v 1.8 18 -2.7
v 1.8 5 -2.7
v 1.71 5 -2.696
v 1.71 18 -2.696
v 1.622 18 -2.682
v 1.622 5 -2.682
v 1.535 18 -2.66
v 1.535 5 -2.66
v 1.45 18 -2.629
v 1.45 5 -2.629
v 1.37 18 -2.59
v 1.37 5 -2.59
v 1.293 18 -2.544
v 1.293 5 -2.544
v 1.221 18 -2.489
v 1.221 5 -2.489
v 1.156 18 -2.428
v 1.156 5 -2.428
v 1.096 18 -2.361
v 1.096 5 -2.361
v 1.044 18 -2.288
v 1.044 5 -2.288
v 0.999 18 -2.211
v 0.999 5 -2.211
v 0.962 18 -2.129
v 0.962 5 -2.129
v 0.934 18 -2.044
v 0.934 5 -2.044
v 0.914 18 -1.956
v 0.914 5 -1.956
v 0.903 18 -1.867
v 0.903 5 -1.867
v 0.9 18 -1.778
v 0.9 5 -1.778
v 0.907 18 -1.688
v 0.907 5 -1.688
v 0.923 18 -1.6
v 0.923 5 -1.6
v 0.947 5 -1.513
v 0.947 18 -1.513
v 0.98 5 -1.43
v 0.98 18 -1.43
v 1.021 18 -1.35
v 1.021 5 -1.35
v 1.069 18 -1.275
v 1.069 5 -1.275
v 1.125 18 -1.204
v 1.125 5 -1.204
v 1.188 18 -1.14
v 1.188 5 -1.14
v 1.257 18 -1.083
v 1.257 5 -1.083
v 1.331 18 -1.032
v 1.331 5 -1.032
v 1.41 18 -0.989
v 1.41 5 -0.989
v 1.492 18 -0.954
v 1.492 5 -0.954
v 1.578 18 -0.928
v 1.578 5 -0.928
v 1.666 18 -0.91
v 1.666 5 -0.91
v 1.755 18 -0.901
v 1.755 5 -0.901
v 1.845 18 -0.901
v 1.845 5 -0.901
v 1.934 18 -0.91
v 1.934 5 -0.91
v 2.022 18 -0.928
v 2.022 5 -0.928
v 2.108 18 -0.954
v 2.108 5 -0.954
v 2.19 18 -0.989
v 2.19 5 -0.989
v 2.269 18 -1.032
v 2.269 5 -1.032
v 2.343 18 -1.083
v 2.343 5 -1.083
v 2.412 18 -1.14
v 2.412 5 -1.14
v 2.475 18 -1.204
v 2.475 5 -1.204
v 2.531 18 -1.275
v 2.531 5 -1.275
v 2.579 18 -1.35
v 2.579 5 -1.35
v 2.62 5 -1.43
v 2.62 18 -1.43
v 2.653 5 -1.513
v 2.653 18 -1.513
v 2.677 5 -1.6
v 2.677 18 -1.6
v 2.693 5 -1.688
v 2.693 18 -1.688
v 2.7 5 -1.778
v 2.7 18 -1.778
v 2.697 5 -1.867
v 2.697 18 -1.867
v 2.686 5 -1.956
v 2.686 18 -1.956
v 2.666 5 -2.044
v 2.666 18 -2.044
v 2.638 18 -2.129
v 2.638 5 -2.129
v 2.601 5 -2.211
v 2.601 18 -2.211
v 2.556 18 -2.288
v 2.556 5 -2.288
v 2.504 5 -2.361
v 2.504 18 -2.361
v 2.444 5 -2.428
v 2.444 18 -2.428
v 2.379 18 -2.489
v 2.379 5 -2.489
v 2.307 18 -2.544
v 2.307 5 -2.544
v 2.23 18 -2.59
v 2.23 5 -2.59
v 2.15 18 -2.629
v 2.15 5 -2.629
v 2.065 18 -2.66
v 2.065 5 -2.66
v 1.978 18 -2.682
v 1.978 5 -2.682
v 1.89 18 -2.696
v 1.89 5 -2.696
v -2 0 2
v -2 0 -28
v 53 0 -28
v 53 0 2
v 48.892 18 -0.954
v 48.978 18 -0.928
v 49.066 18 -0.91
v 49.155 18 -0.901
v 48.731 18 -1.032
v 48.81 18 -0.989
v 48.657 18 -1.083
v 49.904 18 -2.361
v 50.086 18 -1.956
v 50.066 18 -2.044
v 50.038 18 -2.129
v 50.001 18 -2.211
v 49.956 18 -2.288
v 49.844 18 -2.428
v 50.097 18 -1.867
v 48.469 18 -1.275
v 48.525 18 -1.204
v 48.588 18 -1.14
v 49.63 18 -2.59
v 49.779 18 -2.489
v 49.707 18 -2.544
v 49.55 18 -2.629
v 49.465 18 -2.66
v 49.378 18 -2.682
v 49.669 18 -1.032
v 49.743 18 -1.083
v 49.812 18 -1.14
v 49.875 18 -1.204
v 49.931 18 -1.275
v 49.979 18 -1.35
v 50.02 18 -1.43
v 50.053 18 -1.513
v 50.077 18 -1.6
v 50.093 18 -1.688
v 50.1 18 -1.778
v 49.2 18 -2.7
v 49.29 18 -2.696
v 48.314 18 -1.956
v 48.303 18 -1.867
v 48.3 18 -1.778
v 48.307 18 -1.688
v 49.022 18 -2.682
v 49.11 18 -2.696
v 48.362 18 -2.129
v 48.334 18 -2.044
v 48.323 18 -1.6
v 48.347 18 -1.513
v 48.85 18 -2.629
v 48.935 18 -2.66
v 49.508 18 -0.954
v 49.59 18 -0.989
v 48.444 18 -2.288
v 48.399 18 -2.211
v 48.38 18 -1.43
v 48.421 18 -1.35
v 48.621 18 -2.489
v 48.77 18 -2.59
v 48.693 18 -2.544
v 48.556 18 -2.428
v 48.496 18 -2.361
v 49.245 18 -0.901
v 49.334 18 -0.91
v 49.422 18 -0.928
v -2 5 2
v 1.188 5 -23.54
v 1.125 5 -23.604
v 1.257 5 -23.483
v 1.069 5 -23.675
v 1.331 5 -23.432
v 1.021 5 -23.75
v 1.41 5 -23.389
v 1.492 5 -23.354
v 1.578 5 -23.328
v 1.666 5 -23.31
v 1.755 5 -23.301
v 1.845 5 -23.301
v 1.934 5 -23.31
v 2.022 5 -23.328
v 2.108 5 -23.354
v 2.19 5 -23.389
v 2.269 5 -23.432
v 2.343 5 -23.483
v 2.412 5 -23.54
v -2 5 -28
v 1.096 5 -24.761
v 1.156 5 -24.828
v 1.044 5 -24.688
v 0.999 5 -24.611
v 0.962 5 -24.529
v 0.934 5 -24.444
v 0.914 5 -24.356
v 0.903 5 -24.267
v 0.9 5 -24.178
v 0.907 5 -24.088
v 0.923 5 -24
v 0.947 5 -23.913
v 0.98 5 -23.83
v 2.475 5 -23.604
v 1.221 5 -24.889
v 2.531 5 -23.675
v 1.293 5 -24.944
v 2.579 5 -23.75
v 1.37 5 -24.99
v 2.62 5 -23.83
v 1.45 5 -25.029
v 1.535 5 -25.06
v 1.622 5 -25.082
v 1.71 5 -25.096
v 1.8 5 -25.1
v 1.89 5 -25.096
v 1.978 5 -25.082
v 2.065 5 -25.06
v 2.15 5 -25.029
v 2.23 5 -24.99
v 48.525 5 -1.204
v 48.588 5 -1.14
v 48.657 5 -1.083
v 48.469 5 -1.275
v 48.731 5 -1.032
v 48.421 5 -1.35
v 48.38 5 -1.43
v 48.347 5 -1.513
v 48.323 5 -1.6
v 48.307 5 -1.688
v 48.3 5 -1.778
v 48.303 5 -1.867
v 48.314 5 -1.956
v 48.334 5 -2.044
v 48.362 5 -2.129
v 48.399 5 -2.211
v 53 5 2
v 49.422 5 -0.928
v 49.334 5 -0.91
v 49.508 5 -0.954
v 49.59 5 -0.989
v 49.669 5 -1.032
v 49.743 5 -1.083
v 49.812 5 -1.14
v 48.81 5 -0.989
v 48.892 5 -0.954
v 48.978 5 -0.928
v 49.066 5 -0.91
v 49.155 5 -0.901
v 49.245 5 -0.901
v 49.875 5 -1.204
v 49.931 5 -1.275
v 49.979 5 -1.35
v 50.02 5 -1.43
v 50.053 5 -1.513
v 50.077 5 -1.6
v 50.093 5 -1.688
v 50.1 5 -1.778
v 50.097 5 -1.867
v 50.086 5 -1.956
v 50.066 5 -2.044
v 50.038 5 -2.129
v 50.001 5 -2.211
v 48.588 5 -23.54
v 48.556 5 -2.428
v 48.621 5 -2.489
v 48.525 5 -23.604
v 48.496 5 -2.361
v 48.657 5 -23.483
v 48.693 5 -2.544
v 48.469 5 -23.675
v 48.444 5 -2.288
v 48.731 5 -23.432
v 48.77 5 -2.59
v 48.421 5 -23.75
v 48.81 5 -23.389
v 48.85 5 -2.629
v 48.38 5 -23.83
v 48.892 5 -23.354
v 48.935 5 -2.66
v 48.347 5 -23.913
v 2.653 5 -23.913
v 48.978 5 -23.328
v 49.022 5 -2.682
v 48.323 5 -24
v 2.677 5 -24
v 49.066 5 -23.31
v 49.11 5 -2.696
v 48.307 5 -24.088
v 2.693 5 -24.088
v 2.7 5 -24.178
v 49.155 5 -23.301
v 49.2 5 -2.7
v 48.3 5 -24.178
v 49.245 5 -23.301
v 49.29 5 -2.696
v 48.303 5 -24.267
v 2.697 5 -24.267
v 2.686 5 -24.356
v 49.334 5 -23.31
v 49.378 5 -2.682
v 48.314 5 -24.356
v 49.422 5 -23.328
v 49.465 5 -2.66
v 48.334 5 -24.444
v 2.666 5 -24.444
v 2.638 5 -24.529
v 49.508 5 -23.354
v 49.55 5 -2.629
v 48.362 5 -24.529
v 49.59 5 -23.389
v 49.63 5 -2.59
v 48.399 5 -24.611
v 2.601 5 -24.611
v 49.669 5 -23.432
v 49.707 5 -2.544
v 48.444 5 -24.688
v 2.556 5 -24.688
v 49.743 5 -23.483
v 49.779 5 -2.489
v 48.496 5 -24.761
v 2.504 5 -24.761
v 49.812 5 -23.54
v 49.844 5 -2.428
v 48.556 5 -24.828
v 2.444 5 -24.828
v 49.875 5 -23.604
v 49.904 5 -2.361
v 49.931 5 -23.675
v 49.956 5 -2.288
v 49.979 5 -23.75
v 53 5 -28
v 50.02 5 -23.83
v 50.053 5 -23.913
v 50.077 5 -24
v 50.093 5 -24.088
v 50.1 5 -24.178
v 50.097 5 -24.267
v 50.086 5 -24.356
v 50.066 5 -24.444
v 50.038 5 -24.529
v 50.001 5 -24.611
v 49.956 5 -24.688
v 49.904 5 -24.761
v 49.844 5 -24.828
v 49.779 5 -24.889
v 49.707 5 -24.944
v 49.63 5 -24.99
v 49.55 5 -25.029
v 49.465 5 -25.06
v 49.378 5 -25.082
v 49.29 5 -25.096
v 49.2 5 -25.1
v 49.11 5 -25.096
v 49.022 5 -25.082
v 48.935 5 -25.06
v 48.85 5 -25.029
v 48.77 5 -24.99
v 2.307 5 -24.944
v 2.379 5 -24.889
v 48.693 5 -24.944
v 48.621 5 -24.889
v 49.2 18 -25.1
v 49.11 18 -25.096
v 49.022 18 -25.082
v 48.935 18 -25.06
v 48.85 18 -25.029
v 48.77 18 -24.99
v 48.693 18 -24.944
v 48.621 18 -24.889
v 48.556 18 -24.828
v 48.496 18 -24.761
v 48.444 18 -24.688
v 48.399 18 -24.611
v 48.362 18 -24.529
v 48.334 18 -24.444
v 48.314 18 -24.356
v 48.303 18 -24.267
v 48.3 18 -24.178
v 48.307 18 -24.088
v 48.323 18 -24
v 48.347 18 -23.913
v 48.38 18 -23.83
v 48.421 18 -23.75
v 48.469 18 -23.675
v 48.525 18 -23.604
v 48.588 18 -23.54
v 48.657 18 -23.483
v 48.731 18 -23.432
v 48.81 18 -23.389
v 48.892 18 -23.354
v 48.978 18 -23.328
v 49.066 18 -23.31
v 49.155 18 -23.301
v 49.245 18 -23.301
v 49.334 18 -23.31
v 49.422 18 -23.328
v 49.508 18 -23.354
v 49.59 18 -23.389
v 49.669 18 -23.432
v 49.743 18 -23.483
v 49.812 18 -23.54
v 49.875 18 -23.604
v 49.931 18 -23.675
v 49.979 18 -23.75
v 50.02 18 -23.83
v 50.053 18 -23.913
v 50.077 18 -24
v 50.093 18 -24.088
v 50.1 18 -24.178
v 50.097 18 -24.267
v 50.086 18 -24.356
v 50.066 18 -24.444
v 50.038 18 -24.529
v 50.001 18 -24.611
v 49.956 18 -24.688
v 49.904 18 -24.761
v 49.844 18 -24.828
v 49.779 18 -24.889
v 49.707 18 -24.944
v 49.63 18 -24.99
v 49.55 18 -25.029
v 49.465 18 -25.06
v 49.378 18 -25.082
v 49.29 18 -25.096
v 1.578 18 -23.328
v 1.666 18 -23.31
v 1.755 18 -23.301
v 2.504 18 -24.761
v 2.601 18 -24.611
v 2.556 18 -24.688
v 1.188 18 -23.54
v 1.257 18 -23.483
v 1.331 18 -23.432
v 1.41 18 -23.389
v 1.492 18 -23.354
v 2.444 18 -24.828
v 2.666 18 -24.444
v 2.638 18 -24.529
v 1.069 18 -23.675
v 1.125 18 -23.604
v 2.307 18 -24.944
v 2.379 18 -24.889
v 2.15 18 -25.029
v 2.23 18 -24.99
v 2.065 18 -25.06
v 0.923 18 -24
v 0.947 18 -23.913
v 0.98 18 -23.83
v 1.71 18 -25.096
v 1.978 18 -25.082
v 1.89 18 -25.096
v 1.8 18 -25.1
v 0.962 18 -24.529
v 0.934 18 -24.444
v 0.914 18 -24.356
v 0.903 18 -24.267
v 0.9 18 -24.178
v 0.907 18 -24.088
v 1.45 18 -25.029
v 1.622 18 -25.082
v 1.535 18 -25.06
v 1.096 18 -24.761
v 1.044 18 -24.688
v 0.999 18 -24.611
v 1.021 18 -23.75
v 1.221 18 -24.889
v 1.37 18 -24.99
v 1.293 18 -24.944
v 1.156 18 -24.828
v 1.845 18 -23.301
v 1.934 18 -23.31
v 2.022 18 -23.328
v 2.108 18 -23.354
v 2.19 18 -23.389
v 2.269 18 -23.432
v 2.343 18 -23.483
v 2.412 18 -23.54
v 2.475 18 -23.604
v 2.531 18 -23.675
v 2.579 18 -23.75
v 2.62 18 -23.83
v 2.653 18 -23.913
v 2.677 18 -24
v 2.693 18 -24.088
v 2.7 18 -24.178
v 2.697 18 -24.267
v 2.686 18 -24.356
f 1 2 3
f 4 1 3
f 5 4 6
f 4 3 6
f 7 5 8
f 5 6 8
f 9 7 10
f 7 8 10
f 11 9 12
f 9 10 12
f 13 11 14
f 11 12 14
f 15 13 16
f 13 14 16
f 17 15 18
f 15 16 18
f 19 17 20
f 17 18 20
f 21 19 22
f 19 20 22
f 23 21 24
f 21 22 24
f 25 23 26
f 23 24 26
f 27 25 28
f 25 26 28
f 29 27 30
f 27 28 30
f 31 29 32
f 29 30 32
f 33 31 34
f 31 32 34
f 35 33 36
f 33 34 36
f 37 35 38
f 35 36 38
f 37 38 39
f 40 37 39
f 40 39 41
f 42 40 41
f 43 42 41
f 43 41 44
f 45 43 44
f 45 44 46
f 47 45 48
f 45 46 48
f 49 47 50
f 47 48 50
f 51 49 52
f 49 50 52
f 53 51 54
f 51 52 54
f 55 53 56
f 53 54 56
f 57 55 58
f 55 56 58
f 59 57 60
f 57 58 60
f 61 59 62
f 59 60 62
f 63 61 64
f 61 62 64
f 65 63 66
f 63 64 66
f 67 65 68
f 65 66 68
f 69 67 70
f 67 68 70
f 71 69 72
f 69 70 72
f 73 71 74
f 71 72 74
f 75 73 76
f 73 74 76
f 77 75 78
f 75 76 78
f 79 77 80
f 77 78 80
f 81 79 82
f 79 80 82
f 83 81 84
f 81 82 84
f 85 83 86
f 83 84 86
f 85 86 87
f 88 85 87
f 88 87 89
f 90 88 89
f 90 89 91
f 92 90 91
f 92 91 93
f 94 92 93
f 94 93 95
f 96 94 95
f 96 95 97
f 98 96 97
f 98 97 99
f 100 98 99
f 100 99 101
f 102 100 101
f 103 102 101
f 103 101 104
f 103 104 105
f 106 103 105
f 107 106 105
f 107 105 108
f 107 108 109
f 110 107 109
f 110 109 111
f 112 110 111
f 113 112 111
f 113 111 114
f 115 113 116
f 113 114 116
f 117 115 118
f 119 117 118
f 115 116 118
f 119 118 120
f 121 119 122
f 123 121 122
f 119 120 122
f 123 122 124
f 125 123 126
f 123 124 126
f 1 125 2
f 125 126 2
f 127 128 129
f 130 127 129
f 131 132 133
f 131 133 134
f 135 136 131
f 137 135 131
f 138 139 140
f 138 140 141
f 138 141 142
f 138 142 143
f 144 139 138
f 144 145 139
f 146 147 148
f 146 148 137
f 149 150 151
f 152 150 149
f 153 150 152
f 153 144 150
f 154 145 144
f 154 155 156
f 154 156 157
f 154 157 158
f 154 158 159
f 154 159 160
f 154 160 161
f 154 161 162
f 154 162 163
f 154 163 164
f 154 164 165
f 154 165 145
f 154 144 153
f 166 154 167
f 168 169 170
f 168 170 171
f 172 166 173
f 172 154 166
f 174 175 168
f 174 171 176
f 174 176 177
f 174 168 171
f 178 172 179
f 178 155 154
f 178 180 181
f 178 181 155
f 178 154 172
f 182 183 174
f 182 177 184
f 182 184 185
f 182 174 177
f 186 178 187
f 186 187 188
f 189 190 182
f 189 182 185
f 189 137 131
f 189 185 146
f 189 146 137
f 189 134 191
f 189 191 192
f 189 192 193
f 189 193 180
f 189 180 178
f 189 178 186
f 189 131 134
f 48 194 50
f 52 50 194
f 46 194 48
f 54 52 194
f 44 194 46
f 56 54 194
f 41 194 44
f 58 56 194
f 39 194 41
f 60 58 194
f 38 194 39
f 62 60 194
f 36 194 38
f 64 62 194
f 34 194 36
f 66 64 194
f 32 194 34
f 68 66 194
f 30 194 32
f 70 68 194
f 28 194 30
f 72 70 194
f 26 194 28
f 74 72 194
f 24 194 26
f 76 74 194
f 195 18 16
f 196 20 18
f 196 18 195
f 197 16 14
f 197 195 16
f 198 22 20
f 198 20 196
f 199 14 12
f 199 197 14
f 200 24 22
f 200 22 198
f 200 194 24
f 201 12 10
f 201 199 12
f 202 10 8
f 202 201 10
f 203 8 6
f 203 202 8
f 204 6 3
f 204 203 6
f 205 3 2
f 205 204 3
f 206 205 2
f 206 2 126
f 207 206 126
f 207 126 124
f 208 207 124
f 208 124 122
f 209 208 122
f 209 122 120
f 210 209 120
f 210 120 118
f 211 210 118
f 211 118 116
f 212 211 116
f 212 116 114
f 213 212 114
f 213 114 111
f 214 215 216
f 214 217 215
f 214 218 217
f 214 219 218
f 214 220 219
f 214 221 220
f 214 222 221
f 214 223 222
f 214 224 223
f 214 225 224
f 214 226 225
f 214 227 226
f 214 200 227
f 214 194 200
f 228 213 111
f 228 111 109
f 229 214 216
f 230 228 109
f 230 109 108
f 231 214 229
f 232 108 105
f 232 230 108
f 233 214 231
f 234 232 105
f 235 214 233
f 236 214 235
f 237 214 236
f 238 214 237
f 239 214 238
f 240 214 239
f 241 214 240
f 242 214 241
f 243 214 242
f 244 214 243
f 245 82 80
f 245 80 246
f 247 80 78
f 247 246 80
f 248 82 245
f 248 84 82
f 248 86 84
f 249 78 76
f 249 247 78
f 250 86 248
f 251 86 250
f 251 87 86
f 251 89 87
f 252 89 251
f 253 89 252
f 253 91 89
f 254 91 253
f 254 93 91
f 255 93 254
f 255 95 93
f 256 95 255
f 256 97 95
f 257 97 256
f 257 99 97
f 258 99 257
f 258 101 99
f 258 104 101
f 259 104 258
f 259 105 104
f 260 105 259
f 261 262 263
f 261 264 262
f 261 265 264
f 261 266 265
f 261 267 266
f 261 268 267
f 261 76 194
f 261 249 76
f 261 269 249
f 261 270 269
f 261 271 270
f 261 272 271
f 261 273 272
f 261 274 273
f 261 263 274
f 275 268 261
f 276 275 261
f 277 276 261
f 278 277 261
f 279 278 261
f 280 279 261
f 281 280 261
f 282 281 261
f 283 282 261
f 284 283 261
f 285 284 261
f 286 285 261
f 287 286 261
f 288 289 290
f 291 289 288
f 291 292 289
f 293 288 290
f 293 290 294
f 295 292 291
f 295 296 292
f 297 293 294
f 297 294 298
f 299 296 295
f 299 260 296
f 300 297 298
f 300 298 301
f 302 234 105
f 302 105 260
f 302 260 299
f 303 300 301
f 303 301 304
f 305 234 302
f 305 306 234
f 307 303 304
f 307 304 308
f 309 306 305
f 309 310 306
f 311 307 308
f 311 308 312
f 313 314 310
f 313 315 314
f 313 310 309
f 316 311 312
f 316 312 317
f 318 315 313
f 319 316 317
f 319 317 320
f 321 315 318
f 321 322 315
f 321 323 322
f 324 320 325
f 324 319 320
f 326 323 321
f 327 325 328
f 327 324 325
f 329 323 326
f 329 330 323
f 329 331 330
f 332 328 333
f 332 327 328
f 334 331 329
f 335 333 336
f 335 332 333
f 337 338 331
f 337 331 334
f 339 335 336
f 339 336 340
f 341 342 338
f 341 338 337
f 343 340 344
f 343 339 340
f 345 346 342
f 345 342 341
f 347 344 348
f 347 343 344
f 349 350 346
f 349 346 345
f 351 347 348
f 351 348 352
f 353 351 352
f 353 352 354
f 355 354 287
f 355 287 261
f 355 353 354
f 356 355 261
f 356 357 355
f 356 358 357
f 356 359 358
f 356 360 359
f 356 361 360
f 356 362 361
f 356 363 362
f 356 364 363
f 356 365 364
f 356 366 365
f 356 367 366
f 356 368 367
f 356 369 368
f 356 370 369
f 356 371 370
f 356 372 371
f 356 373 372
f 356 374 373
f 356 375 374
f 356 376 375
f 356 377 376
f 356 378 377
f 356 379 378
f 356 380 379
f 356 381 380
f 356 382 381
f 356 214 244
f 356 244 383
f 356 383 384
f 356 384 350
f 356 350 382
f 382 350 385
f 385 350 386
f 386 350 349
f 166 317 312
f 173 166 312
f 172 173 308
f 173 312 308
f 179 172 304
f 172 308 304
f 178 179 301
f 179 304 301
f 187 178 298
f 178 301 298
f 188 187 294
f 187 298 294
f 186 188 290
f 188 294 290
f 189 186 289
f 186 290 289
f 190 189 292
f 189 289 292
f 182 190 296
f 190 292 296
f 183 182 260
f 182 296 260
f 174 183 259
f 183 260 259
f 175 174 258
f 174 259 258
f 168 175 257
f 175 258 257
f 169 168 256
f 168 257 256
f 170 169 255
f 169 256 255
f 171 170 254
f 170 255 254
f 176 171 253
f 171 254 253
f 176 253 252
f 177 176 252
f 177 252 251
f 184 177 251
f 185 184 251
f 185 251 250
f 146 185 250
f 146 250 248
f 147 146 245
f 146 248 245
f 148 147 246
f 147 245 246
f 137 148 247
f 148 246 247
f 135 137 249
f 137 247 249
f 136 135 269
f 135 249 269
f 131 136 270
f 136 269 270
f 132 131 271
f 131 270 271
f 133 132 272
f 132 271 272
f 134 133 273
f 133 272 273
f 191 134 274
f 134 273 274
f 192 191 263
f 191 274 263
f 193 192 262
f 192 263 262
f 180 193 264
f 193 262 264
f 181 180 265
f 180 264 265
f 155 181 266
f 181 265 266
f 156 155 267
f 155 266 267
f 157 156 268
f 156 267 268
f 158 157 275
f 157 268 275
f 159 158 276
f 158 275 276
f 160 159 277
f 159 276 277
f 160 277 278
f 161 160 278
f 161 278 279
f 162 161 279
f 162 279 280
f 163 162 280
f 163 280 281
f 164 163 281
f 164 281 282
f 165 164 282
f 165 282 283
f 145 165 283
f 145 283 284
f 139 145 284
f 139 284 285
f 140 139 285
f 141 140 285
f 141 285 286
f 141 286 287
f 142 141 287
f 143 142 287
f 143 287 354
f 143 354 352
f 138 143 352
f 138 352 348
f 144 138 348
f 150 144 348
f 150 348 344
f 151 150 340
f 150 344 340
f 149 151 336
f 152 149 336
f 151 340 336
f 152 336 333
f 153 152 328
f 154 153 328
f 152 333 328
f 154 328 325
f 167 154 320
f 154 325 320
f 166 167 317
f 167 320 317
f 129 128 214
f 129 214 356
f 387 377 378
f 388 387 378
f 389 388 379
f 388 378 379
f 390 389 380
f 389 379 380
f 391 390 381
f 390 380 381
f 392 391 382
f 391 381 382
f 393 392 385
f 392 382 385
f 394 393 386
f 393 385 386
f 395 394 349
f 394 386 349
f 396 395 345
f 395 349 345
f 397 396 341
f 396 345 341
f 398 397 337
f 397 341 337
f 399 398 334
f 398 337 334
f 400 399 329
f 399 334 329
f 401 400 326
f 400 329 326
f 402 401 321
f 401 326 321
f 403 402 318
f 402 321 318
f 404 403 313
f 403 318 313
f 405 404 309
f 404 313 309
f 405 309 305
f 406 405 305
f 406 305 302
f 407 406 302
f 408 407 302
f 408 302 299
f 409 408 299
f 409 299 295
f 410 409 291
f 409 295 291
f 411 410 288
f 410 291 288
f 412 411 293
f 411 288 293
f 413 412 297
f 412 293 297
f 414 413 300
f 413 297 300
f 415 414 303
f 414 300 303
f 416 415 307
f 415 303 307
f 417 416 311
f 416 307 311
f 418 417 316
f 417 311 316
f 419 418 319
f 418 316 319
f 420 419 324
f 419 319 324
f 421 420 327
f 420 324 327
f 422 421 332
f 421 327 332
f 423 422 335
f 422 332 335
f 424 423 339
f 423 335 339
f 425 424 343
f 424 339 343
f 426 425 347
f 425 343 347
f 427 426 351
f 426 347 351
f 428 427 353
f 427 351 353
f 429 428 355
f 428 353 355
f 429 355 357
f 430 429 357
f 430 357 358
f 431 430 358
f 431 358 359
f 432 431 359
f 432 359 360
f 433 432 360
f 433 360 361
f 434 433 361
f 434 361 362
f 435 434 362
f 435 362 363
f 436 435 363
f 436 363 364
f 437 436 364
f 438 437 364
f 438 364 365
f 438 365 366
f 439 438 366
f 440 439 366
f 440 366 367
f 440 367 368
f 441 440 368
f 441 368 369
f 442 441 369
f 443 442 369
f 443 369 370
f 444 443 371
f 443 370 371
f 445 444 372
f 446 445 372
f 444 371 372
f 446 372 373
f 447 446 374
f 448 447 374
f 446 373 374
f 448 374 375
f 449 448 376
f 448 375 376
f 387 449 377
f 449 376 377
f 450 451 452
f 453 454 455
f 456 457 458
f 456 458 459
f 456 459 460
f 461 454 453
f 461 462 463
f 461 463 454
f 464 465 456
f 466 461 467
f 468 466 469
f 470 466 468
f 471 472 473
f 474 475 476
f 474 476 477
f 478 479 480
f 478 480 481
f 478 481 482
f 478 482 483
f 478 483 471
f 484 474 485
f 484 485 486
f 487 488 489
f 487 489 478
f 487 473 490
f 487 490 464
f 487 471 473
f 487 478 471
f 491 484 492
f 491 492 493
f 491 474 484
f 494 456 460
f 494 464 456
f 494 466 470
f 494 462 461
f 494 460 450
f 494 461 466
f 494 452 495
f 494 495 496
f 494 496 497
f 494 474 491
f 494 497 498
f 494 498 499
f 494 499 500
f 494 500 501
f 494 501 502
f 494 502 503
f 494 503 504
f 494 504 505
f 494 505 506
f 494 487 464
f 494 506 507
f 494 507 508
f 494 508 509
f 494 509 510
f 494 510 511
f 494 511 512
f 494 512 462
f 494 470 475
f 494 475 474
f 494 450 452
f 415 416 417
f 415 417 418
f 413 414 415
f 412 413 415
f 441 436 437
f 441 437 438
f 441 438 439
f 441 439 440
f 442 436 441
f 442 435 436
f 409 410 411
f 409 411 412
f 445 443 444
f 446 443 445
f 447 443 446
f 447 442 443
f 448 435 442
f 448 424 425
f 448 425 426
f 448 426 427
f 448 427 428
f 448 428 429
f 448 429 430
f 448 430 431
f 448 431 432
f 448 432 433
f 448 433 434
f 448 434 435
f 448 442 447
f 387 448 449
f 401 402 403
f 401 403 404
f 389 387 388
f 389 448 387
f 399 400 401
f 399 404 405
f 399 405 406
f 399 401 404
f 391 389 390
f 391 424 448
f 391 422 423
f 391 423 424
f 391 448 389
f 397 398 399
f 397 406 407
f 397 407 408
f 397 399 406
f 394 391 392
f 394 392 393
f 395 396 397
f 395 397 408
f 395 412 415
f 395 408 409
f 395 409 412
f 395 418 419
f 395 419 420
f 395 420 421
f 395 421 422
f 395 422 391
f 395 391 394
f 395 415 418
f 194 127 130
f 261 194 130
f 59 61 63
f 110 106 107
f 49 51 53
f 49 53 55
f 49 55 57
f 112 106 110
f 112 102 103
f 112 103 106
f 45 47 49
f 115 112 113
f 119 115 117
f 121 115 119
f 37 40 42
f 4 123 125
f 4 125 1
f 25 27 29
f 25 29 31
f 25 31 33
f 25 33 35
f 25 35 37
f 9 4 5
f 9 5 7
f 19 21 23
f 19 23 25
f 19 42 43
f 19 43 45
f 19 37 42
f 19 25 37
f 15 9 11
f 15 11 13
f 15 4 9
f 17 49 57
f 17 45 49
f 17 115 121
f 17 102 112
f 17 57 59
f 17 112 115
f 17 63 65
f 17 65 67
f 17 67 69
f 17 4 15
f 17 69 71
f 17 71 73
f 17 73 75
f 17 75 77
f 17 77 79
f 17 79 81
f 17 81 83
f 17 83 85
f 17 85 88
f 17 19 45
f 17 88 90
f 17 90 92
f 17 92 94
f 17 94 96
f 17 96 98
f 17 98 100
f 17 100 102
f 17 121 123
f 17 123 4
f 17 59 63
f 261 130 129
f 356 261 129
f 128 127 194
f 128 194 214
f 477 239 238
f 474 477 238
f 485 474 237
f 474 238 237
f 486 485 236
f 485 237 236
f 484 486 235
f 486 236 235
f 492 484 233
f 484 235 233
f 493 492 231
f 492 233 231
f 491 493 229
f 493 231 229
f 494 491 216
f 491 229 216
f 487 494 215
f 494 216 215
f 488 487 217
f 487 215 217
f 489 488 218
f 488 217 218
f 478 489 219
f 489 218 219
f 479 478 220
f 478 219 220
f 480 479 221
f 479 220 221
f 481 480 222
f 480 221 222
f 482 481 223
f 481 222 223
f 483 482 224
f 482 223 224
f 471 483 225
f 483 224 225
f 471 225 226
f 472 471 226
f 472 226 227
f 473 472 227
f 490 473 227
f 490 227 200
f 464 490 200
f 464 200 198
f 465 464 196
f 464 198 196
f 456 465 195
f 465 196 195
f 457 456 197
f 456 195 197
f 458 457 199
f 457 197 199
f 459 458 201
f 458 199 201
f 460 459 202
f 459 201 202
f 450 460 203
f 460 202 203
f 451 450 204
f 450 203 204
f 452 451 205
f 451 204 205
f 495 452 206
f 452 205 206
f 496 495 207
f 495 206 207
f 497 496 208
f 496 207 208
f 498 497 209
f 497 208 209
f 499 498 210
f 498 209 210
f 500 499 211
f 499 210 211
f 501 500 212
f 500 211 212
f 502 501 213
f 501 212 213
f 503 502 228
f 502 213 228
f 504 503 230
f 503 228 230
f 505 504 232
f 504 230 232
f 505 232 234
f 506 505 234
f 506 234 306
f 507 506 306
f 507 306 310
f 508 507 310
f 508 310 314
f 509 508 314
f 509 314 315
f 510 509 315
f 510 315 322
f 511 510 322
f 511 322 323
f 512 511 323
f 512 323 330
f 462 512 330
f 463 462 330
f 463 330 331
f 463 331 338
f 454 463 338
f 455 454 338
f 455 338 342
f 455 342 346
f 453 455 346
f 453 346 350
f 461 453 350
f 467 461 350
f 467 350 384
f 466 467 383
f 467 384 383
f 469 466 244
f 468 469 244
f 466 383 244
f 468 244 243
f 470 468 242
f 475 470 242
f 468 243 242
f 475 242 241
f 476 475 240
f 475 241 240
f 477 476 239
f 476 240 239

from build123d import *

# Parameters (mm, degrees)
SKETCH1_W           = 55
SKETCH1_H           = 30
BOSS_EXTRUDE1_DEPTH = 5
SKETCH2_R           = 0.9
BOSS_EXTRUDE2_DEPTH = 13


with BuildPart() as part:
    # Sketch1 → Boss-Extrude1 (new body)
    with BuildSketch(Plane(origin=(0, 0, 0), x_dir=(1, 0, 0), z_dir=(0, 1, 0))):
        with Locations((25.5, 13)):
            Rectangle(SKETCH1_W, SKETCH1_H)
    extrude(amount=BOSS_EXTRUDE1_DEPTH)

    # Sketch2 → Boss-Extrude2 (add)
    with BuildSketch(Plane(origin=(0, 5, 0), x_dir=(1, 0, 0), z_dir=(0, 1, 0))):
        with Locations(Location((1.8, 24.2, 0), (0, 0, 90))):
            Circle(SKETCH2_R)
        with Locations(Location((49.2, 24.2, 0), (0, 0, 90))):
            Circle(SKETCH2_R)
        with Locations(Location((49.2, 1.8, 0), (0, 0, 90))):
            Circle(SKETCH2_R)
        with Locations(Location((1.8, 1.8, 0), (0, 0, 90))):
            Circle(SKETCH2_R)
    extrude(amount=BOSS_EXTRUDE2_DEPTH)


solid = part.part
